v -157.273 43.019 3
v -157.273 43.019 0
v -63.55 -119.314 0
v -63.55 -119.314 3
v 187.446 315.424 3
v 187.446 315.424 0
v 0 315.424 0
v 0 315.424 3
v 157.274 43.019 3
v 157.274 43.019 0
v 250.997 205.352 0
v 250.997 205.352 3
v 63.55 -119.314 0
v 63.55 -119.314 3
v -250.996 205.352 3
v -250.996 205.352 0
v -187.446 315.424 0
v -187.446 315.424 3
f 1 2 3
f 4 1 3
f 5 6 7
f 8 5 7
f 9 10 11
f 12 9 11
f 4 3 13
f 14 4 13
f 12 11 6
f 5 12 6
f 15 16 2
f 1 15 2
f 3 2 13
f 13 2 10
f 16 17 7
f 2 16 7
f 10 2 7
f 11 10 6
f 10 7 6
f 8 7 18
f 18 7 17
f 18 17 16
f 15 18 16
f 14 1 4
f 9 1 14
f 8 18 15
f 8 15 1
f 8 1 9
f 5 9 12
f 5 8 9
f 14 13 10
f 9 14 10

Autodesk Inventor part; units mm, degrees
ref_plane "YZ Plane" through (0, 0, 0) normal (1, 0, 0) x (0, 1, 0)
ref_plane "XZ Plane" through (0, 0, 0) normal (0, 1, 0) x (-1, 0, 0)
ref_plane "XY Plane" through (0, 0, 0) normal (0, 0, 1) x (1, 0, 0)
sketch "Sketch1" plane through (0, 0, 0) normal (0, 0, 1) x (1, 0, 0)
  line L0 (250.9966, 205.3522) -> (187.4463, 315.4245)
  line L1 (187.4463, 315.4245) -> (-0.0002, 315.4245)
  line L2 (157.2736, 43.0193) -> (250.9966, 205.3522)
  line L3 (-63.5502, -119.3142) -> (63.5503, -119.3142)
  line L4 (63.5503, -119.3142) -> (157.2736, 43.0193)
  line L5 (-157.2732, 43.0188) -> (-63.5502, -119.3142)
  line L6 (-187.4461, 315.4245) -> (-250.9964, 205.3523)
  line L7 (-250.9964, 205.3523) -> (-157.2732, 43.0188)
  line L8 (-0.0002, 315.4245) -> (-187.4461, 315.4245)
extrude "Extrusion1" add sketch "Sketch1" along normal blind 3
properties part number "glass" material "Glass"
